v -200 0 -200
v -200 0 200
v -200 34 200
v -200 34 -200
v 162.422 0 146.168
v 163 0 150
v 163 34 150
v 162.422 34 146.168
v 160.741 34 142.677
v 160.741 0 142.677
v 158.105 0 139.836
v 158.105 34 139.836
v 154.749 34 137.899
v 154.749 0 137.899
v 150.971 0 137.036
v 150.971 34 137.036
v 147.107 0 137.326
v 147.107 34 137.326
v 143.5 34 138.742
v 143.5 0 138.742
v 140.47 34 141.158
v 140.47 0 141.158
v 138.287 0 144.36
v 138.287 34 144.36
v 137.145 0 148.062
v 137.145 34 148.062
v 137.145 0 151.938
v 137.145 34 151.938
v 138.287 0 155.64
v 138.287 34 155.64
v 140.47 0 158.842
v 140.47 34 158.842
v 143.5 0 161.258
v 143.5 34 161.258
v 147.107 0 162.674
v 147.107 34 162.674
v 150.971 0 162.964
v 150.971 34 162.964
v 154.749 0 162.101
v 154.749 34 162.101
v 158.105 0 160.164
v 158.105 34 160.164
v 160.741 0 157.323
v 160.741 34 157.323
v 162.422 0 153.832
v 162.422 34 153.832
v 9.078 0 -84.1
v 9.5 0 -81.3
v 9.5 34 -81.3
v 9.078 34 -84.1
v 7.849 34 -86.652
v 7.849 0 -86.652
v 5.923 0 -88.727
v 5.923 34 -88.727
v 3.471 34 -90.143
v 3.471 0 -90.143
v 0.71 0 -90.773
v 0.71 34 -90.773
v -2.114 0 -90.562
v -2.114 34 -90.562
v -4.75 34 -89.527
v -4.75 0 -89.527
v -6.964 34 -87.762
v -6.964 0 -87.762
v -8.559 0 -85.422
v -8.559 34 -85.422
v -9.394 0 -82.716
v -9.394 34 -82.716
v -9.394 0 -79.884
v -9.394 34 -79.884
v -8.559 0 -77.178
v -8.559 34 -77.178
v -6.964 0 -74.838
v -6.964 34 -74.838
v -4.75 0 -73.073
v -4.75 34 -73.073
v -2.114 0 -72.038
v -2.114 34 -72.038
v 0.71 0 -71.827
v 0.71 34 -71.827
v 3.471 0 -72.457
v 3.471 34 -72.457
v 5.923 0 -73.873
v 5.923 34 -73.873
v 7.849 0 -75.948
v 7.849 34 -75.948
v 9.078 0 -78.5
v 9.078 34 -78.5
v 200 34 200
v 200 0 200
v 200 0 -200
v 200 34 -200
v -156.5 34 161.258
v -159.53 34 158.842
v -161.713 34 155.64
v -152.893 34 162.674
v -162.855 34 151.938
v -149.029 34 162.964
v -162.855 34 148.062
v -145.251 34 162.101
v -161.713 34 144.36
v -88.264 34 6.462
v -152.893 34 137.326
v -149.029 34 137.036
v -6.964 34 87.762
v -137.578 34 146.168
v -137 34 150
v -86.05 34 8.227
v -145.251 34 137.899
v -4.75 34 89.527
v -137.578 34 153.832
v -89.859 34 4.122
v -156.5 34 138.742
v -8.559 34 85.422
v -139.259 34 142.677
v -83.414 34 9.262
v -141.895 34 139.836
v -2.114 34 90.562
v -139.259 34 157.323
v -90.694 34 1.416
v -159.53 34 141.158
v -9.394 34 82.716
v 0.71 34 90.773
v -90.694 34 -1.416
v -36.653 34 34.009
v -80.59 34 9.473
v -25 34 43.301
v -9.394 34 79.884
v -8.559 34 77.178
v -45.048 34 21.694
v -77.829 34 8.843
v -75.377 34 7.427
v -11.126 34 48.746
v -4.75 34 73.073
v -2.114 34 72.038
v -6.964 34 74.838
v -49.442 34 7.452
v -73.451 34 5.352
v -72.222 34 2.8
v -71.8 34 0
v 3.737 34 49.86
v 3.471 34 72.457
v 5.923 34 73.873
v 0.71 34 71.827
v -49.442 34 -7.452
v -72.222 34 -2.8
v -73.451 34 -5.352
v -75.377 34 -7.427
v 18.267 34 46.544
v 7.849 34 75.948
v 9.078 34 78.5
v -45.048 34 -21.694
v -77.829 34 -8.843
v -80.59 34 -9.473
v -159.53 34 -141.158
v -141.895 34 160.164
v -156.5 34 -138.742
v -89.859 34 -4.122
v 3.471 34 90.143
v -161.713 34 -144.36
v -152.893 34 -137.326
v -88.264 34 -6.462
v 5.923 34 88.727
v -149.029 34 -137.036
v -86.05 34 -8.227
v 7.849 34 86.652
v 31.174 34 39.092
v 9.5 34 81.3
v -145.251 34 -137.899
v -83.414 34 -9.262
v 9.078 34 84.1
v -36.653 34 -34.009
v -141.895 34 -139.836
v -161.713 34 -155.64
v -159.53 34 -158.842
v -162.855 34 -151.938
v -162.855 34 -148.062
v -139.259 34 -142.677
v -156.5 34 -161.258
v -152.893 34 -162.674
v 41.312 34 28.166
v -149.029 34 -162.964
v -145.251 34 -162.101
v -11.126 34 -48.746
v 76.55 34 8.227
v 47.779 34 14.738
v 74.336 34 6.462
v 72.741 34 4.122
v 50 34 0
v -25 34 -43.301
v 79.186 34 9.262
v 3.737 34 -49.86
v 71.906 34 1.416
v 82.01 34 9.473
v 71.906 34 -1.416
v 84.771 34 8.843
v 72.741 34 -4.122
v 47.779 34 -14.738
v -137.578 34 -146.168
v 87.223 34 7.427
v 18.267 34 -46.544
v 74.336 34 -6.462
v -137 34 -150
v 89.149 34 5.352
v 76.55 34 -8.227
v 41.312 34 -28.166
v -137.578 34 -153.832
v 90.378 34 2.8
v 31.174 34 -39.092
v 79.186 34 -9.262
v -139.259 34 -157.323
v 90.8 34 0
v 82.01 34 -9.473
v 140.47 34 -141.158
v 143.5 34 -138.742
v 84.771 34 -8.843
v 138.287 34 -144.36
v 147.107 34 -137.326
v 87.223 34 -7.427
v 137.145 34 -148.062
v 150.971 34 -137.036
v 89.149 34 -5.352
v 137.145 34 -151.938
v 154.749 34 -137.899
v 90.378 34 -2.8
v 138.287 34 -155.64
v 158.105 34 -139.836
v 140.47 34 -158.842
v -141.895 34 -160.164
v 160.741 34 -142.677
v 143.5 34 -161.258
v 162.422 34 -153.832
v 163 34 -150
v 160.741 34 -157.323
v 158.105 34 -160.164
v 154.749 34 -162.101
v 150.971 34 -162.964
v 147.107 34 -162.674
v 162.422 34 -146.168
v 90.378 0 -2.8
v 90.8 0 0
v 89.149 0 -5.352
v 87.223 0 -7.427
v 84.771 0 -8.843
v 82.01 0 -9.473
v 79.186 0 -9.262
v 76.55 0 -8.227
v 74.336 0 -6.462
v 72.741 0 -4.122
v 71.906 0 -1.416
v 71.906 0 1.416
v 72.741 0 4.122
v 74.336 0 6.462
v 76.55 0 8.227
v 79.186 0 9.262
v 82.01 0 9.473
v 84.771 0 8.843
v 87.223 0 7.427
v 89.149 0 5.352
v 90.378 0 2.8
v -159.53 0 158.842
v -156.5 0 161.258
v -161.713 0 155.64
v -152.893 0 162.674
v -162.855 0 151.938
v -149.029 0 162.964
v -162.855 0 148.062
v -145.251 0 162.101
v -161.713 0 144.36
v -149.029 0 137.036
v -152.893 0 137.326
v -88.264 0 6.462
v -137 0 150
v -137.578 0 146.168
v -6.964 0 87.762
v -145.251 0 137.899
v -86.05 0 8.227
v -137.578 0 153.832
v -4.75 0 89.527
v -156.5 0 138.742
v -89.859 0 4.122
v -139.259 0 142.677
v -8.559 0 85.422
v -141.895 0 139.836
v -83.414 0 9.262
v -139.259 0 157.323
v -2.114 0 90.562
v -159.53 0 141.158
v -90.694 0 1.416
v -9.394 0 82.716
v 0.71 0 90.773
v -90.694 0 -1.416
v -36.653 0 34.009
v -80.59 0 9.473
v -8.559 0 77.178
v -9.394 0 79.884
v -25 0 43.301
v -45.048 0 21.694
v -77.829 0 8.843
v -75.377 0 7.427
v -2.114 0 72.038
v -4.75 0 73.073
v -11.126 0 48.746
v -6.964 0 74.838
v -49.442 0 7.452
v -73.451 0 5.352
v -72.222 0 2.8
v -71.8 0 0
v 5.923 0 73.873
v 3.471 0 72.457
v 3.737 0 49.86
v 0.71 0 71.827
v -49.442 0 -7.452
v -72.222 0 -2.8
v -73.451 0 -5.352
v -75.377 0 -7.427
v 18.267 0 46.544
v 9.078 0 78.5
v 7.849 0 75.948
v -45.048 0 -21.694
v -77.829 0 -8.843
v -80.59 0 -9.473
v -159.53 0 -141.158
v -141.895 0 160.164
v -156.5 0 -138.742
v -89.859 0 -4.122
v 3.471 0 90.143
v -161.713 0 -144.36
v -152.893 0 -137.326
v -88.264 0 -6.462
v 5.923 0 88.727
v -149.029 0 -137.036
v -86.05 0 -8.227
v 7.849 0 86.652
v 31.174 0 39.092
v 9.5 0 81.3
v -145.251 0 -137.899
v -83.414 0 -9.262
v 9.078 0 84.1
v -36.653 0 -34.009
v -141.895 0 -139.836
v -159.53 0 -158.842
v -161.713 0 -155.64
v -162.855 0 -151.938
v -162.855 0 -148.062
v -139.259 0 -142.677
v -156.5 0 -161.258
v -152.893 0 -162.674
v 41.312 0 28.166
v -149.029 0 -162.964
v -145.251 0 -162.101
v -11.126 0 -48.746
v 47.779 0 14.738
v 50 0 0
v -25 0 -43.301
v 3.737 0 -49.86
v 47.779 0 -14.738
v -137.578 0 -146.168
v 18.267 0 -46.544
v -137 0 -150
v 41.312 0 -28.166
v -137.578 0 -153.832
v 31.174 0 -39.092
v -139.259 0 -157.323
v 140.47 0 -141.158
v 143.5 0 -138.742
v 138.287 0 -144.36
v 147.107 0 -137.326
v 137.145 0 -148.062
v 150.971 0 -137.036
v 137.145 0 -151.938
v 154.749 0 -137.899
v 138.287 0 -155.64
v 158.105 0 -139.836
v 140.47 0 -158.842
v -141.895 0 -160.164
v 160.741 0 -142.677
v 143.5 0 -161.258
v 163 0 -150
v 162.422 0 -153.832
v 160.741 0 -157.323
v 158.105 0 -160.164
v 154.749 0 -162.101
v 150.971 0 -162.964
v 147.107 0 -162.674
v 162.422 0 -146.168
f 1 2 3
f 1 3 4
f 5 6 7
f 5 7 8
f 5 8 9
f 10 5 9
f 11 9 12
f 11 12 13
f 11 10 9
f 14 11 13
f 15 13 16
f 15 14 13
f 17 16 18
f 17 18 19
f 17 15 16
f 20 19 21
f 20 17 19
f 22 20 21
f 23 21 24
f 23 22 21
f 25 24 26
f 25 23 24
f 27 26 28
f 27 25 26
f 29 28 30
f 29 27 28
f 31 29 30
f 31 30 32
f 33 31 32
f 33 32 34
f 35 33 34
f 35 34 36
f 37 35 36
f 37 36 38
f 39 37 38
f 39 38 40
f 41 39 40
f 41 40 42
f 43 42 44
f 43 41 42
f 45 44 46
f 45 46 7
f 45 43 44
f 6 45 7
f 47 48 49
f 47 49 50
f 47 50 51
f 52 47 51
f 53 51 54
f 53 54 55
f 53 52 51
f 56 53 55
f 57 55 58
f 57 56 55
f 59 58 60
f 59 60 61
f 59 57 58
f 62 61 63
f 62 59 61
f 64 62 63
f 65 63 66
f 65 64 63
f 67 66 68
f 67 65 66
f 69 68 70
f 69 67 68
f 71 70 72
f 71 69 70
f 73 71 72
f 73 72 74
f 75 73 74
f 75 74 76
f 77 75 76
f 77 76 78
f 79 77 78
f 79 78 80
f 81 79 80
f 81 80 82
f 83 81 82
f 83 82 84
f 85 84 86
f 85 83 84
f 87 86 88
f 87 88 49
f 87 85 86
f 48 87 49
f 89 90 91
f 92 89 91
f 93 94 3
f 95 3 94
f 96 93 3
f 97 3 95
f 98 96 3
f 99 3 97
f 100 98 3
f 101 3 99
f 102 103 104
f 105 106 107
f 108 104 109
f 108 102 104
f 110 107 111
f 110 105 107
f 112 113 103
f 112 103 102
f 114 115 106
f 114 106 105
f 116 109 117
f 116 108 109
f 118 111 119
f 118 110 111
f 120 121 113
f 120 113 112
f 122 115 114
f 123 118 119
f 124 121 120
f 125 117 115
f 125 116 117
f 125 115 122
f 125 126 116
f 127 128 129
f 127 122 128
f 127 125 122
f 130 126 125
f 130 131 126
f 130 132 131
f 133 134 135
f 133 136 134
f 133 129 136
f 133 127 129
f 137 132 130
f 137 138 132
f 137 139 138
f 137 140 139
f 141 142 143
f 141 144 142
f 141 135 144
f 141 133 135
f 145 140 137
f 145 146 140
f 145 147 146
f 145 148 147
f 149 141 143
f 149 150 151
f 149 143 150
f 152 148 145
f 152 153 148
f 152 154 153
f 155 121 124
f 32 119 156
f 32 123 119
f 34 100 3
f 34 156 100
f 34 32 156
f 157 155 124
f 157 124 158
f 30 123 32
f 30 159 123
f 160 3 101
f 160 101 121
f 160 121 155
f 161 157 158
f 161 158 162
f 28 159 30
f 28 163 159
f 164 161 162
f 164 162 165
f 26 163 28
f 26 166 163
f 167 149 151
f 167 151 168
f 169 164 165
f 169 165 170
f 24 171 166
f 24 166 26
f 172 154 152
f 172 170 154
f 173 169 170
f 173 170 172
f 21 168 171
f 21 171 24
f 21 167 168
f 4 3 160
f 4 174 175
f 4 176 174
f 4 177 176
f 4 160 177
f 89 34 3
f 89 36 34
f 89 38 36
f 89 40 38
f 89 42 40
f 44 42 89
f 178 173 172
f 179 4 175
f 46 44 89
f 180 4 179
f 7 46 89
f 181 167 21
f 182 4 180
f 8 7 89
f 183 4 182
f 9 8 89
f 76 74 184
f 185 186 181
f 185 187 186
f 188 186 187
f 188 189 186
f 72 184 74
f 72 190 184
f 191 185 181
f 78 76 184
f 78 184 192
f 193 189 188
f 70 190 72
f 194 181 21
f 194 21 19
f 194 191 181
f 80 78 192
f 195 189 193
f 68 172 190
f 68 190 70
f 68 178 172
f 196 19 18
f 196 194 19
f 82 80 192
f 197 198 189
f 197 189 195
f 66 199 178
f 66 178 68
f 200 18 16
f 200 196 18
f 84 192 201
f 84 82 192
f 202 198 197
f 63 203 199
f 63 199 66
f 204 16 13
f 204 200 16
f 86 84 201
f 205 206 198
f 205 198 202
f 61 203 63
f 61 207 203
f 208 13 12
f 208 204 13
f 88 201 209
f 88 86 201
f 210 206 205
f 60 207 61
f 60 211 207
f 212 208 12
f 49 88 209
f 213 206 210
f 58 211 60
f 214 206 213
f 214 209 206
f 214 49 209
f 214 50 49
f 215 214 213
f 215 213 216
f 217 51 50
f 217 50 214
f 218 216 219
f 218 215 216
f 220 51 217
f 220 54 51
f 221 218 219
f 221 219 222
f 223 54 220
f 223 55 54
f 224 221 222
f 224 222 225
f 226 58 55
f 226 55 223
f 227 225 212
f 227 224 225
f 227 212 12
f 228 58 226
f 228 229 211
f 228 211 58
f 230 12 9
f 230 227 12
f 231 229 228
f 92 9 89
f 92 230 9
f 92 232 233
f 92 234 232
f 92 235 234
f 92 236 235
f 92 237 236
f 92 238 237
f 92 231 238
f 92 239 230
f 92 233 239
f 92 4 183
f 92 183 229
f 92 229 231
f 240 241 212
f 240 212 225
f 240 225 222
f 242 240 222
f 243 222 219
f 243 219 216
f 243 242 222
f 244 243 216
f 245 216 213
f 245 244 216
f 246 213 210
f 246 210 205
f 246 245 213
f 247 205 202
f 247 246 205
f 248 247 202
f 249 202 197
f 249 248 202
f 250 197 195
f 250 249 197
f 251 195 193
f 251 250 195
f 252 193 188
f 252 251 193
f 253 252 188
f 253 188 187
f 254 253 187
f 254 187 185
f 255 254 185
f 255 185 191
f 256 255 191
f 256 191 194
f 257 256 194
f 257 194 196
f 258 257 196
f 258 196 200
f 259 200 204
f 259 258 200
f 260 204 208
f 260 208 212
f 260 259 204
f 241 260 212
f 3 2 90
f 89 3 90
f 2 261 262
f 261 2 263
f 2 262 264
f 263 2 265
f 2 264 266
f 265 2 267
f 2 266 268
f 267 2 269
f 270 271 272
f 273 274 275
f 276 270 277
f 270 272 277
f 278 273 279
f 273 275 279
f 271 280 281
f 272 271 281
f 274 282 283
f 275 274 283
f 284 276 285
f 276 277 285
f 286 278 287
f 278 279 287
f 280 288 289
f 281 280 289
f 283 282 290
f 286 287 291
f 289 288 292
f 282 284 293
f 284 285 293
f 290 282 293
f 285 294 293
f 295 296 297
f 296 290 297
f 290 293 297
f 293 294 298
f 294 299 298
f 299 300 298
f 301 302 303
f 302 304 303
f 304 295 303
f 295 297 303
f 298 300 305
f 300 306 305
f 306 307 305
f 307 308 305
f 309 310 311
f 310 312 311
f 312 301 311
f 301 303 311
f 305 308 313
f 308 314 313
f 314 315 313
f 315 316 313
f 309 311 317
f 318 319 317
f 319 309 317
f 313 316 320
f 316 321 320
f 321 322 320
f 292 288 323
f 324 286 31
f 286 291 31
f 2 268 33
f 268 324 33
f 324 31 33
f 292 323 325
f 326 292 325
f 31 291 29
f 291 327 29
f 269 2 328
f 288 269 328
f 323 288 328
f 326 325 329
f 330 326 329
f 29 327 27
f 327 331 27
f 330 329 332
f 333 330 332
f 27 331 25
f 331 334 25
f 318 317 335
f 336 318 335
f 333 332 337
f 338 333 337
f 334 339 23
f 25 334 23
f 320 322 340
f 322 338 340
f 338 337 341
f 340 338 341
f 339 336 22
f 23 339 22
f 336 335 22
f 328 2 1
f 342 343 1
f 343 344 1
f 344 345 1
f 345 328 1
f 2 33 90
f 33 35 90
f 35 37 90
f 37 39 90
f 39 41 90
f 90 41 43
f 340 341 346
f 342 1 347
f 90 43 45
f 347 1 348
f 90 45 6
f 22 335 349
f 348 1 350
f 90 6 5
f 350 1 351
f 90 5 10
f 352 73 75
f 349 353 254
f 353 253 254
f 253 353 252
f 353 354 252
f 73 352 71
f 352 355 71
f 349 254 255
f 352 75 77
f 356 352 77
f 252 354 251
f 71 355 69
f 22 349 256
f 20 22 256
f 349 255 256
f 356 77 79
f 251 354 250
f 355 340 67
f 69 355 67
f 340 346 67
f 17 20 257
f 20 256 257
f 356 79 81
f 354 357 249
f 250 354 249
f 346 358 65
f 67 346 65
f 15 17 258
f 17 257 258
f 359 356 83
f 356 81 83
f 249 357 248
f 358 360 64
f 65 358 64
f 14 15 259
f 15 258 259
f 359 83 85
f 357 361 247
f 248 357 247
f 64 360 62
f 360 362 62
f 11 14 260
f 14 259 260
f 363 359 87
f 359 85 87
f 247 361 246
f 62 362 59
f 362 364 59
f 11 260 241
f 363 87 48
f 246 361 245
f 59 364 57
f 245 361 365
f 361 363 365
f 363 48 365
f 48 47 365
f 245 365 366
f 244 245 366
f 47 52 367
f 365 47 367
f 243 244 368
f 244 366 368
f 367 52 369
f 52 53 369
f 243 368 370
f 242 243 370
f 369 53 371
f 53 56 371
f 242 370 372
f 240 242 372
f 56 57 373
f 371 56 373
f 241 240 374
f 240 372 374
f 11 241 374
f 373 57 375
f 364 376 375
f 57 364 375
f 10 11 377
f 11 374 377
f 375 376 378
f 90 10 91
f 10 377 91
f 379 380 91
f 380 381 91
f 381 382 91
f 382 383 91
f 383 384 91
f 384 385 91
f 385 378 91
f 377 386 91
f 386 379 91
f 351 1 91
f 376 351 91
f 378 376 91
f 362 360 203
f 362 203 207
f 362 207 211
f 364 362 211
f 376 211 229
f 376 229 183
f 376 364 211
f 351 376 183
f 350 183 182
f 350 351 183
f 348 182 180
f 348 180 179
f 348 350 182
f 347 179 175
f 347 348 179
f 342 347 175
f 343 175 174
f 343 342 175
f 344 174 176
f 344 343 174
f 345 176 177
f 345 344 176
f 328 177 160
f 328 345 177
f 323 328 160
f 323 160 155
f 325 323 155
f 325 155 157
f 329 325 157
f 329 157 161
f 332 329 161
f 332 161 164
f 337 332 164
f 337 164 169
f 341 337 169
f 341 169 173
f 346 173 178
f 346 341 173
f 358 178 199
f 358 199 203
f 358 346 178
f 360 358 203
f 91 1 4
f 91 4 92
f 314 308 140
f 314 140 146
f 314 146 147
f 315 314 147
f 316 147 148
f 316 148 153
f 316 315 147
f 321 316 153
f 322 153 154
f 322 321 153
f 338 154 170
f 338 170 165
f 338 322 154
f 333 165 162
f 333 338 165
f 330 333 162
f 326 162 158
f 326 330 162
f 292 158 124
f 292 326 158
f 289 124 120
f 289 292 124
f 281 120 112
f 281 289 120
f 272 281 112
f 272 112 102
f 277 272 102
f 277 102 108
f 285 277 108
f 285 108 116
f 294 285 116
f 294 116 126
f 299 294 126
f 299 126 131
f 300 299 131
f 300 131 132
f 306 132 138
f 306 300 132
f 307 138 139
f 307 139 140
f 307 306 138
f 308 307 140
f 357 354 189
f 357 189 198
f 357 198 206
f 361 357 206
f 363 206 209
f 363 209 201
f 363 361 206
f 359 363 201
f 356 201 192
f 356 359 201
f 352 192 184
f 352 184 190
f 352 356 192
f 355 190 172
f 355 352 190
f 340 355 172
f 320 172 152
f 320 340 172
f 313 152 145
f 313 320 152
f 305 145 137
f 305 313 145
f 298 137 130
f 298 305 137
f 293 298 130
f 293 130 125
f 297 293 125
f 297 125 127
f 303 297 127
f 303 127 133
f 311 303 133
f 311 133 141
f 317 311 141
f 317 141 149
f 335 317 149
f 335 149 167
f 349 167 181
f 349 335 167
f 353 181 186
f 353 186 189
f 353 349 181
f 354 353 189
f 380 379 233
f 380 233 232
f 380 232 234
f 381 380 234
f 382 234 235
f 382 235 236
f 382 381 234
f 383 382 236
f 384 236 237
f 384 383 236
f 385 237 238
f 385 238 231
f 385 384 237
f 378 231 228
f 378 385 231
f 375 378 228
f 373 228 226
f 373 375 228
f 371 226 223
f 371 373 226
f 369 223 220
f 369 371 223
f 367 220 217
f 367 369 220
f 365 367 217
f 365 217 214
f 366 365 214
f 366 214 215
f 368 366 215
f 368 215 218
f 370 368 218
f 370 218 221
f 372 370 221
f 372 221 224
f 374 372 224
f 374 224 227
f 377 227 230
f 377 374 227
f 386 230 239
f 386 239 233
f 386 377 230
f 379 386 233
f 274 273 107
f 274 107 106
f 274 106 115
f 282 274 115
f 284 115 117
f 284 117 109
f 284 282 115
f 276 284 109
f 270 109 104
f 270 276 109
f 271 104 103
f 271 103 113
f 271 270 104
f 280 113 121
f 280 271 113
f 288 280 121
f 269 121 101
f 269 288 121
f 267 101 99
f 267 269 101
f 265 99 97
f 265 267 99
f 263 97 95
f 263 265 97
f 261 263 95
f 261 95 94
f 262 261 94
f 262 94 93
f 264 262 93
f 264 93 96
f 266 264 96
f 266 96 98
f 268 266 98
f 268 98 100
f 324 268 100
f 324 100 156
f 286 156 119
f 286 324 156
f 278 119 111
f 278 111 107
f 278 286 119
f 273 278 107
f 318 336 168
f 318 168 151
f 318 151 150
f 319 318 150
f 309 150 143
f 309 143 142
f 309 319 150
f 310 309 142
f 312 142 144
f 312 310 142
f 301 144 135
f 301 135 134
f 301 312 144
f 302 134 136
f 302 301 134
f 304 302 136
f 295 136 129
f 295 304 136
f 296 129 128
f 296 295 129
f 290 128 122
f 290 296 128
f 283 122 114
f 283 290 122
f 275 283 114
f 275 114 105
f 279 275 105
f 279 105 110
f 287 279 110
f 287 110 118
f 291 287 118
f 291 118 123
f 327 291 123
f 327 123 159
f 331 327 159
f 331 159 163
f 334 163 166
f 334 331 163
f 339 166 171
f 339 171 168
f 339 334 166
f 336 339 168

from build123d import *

# Parameters (mm, degrees)
SKETCH1_W           = 400
SKETCH1_H           = 400
SKETCH1_R           = 13
SKETCH1_R_2         = 50
SKETCH1_R_3         = 9.5
BOSS_EXTRUDE1_DEPTH = 34


with BuildPart() as part:
    # Sketch1 → Boss-Extrude1 (new body)
    with BuildSketch(Plane(origin=(0, 0, 0), x_dir=(1, 0, 0), z_dir=(0, 1, 0))):
        Rectangle(SKETCH1_W, SKETCH1_H)
        with Locations((-150, 150)):
            Circle(SKETCH1_R, mode=Mode.SUBTRACT)
        with Locations((-150, -150)):
            Circle(SKETCH1_R, mode=Mode.SUBTRACT)
        with Locations((150, -150)):
            Circle(SKETCH1_R, mode=Mode.SUBTRACT)
        with Locations((150, 150)):
            Circle(SKETCH1_R, mode=Mode.SUBTRACT)
        Circle(SKETCH1_R_2, mode=Mode.SUBTRACT)
        with Locations((0, 81.3)):
            Circle(SKETCH1_R_3, mode=Mode.SUBTRACT)
        with Locations((-81.3, 0)):
            Circle(SKETCH1_R_3, mode=Mode.SUBTRACT)
        with Locations((0, -81.3)):
            Circle(SKETCH1_R_3, mode=Mode.SUBTRACT)
        with Locations((81.3, 0)):
            Circle(SKETCH1_R_3, mode=Mode.SUBTRACT)
    extrude(amount=BOSS_EXTRUDE1_DEPTH)


solid = part.part
